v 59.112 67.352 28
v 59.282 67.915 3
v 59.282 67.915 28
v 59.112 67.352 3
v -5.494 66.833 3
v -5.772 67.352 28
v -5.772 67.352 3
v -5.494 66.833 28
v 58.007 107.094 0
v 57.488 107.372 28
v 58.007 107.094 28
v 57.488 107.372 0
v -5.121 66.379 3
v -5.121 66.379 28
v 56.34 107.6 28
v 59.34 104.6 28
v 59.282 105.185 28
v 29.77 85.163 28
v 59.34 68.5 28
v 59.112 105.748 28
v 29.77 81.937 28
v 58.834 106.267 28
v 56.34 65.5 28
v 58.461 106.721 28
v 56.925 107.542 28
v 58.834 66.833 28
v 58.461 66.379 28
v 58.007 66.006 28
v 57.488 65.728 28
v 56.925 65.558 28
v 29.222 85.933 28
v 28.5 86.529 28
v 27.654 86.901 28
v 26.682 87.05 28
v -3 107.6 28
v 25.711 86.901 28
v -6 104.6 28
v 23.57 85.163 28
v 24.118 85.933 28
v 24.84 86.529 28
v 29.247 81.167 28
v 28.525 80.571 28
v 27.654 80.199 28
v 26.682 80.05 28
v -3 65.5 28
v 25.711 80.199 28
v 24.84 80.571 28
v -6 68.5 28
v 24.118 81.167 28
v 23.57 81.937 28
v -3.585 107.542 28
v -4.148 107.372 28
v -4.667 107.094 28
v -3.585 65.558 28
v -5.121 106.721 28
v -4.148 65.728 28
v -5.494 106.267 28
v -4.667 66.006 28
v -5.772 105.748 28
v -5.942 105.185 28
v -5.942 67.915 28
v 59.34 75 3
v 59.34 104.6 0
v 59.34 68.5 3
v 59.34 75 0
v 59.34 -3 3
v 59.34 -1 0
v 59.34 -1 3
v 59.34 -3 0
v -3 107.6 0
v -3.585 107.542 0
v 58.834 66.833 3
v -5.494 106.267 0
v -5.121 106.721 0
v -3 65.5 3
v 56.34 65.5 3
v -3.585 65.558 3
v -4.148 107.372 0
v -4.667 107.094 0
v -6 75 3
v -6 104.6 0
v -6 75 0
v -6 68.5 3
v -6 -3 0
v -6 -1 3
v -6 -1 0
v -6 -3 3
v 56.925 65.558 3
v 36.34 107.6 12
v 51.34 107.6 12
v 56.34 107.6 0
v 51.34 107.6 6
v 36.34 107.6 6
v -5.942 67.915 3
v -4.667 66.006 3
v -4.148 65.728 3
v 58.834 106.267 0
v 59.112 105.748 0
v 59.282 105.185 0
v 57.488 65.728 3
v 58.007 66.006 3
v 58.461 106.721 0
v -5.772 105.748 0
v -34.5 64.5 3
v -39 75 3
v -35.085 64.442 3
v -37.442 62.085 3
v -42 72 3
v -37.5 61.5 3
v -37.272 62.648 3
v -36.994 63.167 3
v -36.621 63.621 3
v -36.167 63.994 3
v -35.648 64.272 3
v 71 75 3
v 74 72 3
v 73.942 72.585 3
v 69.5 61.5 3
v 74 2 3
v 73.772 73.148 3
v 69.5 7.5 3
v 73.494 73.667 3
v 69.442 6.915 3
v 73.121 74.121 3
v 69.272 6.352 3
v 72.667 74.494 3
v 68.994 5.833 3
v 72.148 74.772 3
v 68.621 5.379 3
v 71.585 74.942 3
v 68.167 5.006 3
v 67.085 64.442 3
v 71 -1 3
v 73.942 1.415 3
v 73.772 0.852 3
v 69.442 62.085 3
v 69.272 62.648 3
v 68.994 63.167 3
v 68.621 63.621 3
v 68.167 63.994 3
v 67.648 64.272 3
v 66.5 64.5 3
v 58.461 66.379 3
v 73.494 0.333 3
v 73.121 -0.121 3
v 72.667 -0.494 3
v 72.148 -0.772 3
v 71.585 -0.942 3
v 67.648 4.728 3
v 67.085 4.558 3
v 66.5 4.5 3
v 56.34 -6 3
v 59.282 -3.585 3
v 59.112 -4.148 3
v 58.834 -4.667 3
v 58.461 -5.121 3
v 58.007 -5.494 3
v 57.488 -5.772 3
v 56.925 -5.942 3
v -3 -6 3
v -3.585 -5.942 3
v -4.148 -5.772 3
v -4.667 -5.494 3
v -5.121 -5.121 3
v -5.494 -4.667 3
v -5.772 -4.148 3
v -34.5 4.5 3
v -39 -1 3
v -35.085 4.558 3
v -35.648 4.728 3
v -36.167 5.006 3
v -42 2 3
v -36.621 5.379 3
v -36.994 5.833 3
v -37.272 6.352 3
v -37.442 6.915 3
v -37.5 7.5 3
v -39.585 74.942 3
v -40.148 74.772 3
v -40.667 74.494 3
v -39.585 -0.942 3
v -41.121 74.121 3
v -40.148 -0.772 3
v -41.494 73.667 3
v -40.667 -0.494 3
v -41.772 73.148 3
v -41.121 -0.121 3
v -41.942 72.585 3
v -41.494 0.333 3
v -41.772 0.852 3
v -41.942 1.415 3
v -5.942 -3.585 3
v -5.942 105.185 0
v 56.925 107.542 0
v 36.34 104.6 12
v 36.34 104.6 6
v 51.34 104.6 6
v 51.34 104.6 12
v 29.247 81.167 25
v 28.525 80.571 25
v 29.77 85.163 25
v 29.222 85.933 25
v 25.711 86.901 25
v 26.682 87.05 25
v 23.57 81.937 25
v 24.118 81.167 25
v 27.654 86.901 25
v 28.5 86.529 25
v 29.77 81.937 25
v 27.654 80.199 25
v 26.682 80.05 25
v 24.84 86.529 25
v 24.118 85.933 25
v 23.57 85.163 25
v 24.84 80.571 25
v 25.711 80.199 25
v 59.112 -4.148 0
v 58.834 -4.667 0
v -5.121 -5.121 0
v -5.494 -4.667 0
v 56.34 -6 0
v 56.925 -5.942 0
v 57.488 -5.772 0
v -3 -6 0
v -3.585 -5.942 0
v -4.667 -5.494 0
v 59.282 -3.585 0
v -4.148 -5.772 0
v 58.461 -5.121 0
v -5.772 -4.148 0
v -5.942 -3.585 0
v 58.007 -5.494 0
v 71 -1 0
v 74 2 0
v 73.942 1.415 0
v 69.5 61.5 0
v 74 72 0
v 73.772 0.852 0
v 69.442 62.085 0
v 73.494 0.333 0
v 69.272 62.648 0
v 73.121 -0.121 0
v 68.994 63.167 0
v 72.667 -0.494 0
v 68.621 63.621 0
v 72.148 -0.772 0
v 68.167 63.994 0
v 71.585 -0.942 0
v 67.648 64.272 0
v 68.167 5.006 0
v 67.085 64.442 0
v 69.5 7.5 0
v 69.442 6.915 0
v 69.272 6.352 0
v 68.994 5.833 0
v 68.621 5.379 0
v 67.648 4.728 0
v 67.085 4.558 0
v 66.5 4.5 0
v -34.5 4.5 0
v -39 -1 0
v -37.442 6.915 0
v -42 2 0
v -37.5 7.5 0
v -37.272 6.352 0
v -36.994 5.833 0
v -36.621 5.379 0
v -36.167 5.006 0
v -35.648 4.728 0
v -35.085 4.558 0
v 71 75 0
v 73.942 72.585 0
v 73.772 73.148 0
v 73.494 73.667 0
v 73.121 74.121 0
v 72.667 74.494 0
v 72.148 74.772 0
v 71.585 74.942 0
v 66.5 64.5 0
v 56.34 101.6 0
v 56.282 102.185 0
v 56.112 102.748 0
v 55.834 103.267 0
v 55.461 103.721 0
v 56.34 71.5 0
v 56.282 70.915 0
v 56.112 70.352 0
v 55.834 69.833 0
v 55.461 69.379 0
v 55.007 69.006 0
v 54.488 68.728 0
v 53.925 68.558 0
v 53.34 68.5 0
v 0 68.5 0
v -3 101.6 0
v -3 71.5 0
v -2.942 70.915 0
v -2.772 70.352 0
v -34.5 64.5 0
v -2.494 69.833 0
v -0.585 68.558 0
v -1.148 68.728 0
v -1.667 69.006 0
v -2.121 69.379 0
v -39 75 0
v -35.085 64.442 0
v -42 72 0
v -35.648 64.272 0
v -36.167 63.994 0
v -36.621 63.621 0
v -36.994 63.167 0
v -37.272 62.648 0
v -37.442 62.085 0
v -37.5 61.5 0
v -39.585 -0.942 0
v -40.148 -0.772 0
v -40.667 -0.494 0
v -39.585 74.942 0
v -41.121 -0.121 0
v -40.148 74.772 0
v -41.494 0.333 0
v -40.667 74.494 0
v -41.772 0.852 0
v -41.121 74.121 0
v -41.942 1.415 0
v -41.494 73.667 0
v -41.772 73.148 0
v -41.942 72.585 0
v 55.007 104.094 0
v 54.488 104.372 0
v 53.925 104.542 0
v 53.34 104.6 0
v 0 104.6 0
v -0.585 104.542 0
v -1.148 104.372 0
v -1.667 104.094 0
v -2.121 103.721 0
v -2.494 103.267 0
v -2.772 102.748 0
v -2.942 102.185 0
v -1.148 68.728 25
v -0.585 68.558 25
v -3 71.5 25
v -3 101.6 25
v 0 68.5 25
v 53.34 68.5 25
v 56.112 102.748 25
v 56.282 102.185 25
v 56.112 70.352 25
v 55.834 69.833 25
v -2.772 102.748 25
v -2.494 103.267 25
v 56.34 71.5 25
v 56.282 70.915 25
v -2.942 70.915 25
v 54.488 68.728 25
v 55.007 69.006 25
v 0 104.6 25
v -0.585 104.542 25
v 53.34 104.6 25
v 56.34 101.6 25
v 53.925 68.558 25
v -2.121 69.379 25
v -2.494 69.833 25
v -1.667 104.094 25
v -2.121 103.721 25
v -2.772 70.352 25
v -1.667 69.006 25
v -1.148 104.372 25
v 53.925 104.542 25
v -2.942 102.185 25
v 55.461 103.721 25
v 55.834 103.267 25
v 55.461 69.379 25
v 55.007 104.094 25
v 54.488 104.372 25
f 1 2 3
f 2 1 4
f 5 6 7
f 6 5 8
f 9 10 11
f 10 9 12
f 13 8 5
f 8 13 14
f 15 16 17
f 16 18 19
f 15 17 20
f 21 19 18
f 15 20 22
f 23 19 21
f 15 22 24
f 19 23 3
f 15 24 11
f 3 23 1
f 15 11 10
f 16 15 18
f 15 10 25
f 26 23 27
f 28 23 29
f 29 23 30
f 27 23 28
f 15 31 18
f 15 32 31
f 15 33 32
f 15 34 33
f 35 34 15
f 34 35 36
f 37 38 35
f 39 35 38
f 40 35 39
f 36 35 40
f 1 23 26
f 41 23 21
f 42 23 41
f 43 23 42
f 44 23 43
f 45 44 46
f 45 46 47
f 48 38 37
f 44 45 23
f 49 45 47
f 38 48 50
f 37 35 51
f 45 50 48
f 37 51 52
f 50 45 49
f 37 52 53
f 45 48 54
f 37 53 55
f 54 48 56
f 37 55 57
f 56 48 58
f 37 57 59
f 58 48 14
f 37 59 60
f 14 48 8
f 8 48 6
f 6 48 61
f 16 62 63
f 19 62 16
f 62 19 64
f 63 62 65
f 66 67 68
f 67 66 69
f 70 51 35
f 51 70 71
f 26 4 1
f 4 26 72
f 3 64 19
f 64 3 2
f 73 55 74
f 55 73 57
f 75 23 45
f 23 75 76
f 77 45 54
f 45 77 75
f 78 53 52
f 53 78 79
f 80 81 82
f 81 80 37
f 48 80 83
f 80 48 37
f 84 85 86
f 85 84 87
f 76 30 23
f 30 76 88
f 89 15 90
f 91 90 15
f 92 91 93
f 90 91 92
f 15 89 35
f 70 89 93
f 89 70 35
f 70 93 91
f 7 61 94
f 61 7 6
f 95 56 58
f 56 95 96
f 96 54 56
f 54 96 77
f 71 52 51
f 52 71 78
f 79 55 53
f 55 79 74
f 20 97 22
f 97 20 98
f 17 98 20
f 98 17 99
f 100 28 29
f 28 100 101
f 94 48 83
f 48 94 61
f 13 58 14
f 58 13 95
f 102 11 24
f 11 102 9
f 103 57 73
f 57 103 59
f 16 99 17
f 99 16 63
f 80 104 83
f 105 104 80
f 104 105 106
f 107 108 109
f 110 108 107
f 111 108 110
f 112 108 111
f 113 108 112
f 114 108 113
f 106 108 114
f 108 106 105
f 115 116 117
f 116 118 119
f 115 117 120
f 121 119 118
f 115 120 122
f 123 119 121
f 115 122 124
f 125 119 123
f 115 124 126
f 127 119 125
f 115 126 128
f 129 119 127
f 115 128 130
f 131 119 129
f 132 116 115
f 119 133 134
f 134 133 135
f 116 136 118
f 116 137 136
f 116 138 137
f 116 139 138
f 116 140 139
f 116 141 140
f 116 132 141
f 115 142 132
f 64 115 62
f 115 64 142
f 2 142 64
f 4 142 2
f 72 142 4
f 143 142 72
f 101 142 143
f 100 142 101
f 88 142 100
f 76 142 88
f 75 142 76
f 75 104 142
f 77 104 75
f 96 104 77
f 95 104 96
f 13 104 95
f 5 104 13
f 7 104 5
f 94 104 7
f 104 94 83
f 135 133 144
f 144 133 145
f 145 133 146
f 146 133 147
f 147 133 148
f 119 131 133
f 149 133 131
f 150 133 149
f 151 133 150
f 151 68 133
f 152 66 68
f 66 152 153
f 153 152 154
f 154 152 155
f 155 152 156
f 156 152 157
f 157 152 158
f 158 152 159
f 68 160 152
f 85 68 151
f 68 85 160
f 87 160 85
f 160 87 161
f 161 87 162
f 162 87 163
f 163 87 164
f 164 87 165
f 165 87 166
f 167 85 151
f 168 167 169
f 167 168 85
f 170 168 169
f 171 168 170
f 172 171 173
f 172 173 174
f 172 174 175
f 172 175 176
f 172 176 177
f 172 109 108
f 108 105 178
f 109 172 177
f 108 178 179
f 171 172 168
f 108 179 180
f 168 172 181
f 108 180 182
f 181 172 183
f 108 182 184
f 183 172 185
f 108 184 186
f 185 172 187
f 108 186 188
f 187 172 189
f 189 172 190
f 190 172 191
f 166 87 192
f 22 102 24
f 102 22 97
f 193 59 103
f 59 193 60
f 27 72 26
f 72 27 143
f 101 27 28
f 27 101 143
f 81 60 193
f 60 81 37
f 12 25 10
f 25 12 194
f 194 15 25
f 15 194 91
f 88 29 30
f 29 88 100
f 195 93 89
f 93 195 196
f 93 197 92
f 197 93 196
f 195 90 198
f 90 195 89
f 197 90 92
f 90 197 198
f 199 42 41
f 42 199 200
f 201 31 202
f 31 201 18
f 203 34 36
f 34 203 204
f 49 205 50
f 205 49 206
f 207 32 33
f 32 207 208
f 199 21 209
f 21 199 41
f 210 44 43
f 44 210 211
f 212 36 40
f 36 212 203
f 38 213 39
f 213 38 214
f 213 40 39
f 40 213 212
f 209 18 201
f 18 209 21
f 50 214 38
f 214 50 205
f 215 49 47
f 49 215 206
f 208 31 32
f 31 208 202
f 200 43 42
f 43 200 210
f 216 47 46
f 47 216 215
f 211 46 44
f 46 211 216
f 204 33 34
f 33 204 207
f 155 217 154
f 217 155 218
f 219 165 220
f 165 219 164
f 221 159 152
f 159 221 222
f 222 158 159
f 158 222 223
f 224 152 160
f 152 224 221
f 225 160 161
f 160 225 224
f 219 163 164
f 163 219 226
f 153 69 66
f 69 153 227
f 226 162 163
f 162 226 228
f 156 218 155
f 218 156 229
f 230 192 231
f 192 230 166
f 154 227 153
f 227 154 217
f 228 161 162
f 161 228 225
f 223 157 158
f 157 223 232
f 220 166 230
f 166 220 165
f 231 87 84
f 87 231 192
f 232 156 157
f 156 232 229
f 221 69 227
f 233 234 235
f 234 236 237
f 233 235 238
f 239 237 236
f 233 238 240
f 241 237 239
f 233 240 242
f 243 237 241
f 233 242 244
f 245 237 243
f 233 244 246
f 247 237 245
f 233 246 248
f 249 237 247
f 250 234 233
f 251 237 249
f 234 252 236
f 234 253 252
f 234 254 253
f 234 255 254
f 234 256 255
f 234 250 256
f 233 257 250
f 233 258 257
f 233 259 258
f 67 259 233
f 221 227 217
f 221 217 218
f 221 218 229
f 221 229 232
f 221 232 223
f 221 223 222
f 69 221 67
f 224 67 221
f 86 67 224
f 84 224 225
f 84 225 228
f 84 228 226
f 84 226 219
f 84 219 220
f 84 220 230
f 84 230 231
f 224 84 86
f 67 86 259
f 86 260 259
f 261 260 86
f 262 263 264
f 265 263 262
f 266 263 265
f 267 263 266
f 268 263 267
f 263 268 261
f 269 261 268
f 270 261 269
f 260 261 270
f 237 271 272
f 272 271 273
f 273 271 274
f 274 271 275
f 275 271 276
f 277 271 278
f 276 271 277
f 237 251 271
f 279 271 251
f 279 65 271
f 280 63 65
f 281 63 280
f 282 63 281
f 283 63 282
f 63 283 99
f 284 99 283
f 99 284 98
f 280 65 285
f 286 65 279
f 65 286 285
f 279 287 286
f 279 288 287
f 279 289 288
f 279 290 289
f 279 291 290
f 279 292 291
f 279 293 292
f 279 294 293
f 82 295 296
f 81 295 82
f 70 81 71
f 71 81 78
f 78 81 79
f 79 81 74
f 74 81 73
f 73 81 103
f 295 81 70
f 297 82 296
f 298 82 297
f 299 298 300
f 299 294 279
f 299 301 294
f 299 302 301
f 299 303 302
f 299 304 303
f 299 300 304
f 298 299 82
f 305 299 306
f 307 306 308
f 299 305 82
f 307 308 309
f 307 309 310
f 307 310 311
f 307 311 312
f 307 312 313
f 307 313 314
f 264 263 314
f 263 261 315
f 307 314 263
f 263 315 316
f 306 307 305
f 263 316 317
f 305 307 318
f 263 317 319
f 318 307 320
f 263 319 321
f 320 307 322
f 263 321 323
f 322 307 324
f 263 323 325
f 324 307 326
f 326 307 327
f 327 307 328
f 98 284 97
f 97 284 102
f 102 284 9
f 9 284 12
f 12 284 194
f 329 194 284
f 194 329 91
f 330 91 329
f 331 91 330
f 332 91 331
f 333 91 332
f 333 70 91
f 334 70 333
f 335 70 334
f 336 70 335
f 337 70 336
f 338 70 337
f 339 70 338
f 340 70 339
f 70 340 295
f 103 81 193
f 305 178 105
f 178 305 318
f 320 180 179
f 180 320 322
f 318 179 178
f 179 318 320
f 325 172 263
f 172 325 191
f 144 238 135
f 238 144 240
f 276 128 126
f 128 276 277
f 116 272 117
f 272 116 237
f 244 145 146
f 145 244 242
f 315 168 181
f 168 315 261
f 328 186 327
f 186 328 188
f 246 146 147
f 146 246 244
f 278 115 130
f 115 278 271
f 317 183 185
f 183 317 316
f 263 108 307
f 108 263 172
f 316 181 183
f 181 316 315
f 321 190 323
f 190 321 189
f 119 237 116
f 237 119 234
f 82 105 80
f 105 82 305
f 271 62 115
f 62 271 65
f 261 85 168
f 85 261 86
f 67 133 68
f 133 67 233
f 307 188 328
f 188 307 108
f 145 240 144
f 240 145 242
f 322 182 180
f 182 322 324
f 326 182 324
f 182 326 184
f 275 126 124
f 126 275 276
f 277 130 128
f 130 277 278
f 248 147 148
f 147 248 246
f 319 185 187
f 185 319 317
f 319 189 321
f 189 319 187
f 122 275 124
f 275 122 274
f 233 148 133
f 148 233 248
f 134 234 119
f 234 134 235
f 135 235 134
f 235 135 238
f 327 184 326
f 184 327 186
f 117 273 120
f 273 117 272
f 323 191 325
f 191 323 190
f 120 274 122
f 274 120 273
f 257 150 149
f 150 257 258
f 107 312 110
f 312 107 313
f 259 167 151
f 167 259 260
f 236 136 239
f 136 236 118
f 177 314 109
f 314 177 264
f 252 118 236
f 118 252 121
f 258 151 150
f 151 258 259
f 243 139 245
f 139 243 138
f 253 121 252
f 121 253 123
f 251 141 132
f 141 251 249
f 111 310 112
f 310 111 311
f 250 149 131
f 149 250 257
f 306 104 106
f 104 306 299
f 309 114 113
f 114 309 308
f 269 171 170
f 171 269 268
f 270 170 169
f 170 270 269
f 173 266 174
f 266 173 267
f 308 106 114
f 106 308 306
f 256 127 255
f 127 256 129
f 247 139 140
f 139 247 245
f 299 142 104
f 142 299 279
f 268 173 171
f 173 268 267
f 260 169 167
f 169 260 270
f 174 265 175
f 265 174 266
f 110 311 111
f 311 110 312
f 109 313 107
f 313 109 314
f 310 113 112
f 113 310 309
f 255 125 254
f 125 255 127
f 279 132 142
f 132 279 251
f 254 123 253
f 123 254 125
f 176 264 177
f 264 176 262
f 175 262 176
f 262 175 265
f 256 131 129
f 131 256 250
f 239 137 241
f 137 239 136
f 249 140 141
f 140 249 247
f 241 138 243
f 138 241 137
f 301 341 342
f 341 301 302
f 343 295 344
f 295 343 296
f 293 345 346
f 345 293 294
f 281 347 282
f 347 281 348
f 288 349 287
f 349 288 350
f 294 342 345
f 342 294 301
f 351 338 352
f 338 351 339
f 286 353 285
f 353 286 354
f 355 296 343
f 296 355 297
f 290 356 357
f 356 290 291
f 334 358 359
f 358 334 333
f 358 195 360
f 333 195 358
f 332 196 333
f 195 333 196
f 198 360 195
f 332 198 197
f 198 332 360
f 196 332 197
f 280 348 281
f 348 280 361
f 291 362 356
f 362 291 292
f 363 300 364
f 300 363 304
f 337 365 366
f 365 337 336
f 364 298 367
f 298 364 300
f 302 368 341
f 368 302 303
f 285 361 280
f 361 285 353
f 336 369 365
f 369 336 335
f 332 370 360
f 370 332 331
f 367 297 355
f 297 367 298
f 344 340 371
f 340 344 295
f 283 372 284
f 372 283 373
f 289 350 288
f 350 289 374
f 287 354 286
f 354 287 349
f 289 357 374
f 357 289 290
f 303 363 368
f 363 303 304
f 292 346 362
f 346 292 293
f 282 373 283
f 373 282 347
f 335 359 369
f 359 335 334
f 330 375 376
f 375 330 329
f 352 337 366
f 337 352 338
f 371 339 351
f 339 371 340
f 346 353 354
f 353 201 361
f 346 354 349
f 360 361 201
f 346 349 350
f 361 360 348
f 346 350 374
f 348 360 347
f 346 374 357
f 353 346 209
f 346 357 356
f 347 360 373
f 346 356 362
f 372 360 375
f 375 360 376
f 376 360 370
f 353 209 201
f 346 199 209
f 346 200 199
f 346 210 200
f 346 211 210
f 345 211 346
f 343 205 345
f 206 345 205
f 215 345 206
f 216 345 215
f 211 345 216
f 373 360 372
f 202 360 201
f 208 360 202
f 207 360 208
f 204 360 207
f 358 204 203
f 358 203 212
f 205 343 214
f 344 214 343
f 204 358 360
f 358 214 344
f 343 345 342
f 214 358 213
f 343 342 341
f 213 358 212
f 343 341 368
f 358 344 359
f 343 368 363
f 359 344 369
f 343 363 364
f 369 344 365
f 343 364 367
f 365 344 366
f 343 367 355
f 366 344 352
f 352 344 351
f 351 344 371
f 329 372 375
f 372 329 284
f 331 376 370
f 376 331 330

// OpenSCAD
// file: pins.scad
// Pin Connectors V3
// Tony Buser <tbuser@gmail.com>
// Modified by Emmett Lalish

object=4;//[0:pin,1:pinpeg,2:pinhole,4:nothing]
length=20;
diameter=8;
//Only affects pinhole
hole_twist=0;//[0:free,1:fixed]
//Only affects pinhole
hole_friction=0;//[0:loose,1:tight]
//Radial gap to help pins fit into tight holes
pin_tolerance=0.2;
//Extra gap to make loose hole
loose=0.3;
lip_height=3;
lip_thickness=1;
hf=hole_friction==0 ? false : true;
ht=hole_twist==0 ? false : true;

if(object==0)pin(h=length,r=diameter/2,lh=lip_height,lt=lip_thickness,t=pin_tolerance);
if(object==1)pinpeg(h=length,r=diameter/2,lh=lip_height,lt=lip_thickness,t=pin_tolerance);
if(object==2)pinhole(h=length,r=diameter/2,lh=lip_height,lt=lip_thickness,t=loose,
	tight=hf,fixed=ht);

module test() {
  tolerance = 0.3;
  
  translate([-12, 12, 0]) pinpeg(h=20);
  translate([12, 12, 0]) pintack(h=10);
  
  difference() {
    union() {
      translate([0, -12, 2.5]) cube(size = [59, 20, 5], center = true);
      translate([24, -12, 7.5]) cube(size = [12, 20, 15], center = true);
    }
    translate([-24, -12, 0]) pinhole(h=5, t=tolerance);
    translate([-12, -12, 0]) pinhole(h=5, t=tolerance, tight=false);
    translate([0, -12, 0]) pinhole(h=10, t=tolerance);
    translate([12, -12, 0]) pinhole(h=10, t=tolerance, tight=false);
    translate([24, -12, 15]) rotate([0, 180, 0]) pinhole(h=10, t=tolerance);
  }
}

module pinhole(h=10, r=4, lh=3, lt=1, t=0.3, tight=true, fixed=false) {
  // h = shaft height
  // r = shaft radius
  // lh = lip height
  // lt = lip thickness
  // t = extra tolerance for loose fit
  // tight = set to false if you want a joint that spins easily
  // fixed = set to true so pins can't spin
  
intersection(){
  union() {
	if (tight == true || fixed == true) {
      pin_solid(h, r, lh, lt);
	  translate([0,0,-t/2])cylinder(h=h+t, r=r, $fn=30);
	} else {
	  pin_solid(h, r+t/2, lh, lt);
	  translate([0,0,-t/2])cylinder(h=h+t, r=r+t/2, $fn=30);
	}
    
    
    // widen the entrance hole to make insertion easier
    //translate([0, 0, -0.1]) cylinder(h=lh/3, r2=r, r1=r+(t/2)+(lt/2),$fn=30);
  }
  if (fixed == true) {
	translate([-r*2, -r*0.75, -1])cube([r*4, r*1.5, h+2]);
  }
}}

module pin(h=10, r=4, lh=3, lt=1, t=0.2, side=false) {
  // h = shaft height
  // r = shaft radius
  // lh = lip height
  // lt = lip thickness
  // side = set to true if you want it printed horizontally

  if (side) {
    pin_horizontal(h, r, lh, lt, t);
  } else {
    pin_vertical(h, r, lh, lt, t);
  }
}

module pintack(h=10, r=4, lh=3, lt=1, t=0.2, bh=3, br=8.75) {
  // bh = base_height
  // br = base_radius
  
  union() {
    cylinder(h=bh, r=br);
    translate([0, 0, bh]) pin(h, r, lh, lt, t);
  }
}

module pinpeg(h=20, r=4, lh=3, lt=1, t=0.2) {
  union() {
    translate([0,-0.05, 0]) pin(h/2+0.1, r, lh, lt, t, side=true);
    translate([0,0.05, 0]) rotate([0, 0, 180]) pin(h/2+0.1, r, lh, lt, t, side=true);
  }
}

// just call pin instead, I made this module because it was easier to do the rotation option this way
// since openscad complains of recursion if I did it all in one module
module pin_vertical(h=10, r=4, lh=3, lt=1, t=0.2) {
  // h = shaft height
  // r = shaft radius
  // lh = lip height
  // lt = lip thickness

  difference() {
    pin_solid(h, r-t/2, lh, lt);
    
    // center cut
    translate([-lt*3/2, -(r*2+lt*2)/2, h/5+lt*3/2]) cube([lt*3, r*2+lt*2, h]);
    //translate([0, 0, h/4]) cylinder(h=h+lh, r=r/2.5, $fn=20);
    // center curve
    translate([0, 0, h/5+lt*3/2]) rotate([90, 0, 0]) cylinder(h=r*2, r=lt*3/2, center=true, $fn=20);
  
    // side cuts
    translate([-r*2, -r-r*0.75+t/2, -1]) cube([r*4, r, h+2]);
    translate([-r*2, r*0.75-t/2, -1]) cube([r*4, r, h+2]);
  }
}

// call pin with side=true instead of this
module pin_horizontal(h=10, r=4, lh=3, lt=1, t=0.2) {
  // h = shaft height
  // r = shaft radius
  // lh = lip height
  // lt = lip thickness
  translate([0, 0, r*0.75-t/2]) rotate([-90, 0, 0]) pin_vertical(h, r, lh, lt, t);
}

// this is mainly to make the pinhole module easier
module pin_solid(h=10, r=4, lh=3, lt=1) {
  union() {
    // shaft
    cylinder(h=h-lh, r=r, $fn=30);
    // lip
    // translate([0, 0, h-lh]) cylinder(h=lh*0.25, r1=r, r2=r+(lt/2), $fn=30);
    // translate([0, 0, h-lh+lh*0.25]) cylinder(h=lh*0.25, r2=r, r1=r+(lt/2), $fn=30);
    // translate([0, 0, h-lh+lh*0.50]) cylinder(h=lh*0.50, r1=r, r2=r-(lt/2), $fn=30);

    // translate([0, 0, h-lh]) cylinder(h=lh*0.50, r1=r, r2=r+(lt/2), $fn=30);
    // translate([0, 0, h-lh+lh*0.50]) cylinder(h=lh*0.50, r1=r+(lt/2), r2=r-(lt/3), $fn=30);    

    translate([0, 0, h-lh]) cylinder(h=lh*0.25, r1=r, r2=r+(lt/2), $fn=30);
    translate([0, 0, h-lh+lh*0.25]) cylinder(h=lh*0.25, r=r+(lt/2), $fn=30);    
    translate([0, 0, h-lh+lh*0.50]) cylinder(h=lh*0.50, r1=r+(lt/2), r2=r-(lt/2), $fn=30);    

    // translate([0, 0, h-lh]) cylinder(h=lh, r1=r+(lt/2), r2=1, $fn=30);
    // translate([0, 0, h-lh-lt/2]) cylinder(h=lt/2, r1=r, r2=r+(lt/2), $fn=30);
  }
}

module pinshaft(h=10, r=4, t=0.2, side=false){
flip=side ? 1 : 0;
translate(flip*[0,h/2,r*0.75-t/2])rotate(flip*[90,0,0])
intersection(){
	cylinder(h=h, r=r-t/2, $fn=30);
	translate([-r*2, -r*0.75+t/2, -1])cube([r*4, r*1.5-t, h+2]);
}
}
// main file
// Arduino connectors library
//
// Copyright (c) 2013 Kelly Egan
//
// The MIT License (MIT)
//
// Permission is hereby granted, free of charge, to any person obtaining a copy of this software 
// and associated documentation files (the "Software"), to deal in the Software without restriction, 
// including without limitation the rights to use, copy, modify, merge, publish, distribute, sublicense,
// and/or sell copies of the Software, and to permit persons to whom the Software is furnished to do 
// so, subject to the following conditions:
//
// The above copyright notice and this permission notice shall be included in all copies or substantial
// portions of the Software.
//
// THE SOFTWARE IS PROVIDED "AS IS", WITHOUT WARRANTY OF ANY KIND, EXPRESS OR IMPLIED, INCLUDING BUT 
// NOT LIMITED TO THE WARRANTIES OF MERCHANTABILITY, FITNESS FOR A PARTICULAR PURPOSE AND NONINFRINGEMENT. 
// IN NO EVENT SHALL THE AUTHORS OR COPYRIGHT HOLDERS BE LIABLE FOR ANY CLAIM, DAMAGES OR OTHER LIABILITY,
// WHETHER IN AN ACTION OF CONTRACT, TORT OR OTHERWISE, ARISING FROM, OUT OF OR IN CONNECTION WITH THE 
// SOFTWARE OR THE USE OR OTHER DEALINGS IN THE SOFTWARE.
//

include <pins.scad>

gdWidth = 70;
gdLength = 110;
gdXOffset = gdLength-36;
gdYOffset = -1;

enclosureLid(MEGA2560);
//enclosure(MEGA2560);

//Constructs a roughed out arduino board
//Current only USB, power and headers
module arduino(boardType = UNO) {
	//The PCB with holes
	difference() {
		color("SteelBlue") 
			boardShape( boardType );
		translate([0,0,-pcbHeight * 0.5]) holePlacement(boardType = boardType)
			color("SteelBlue") cylinder(r = mountingHoleRadius, h = pcbHeight * 2, $fn=32);
	}
	//Add all components to board
	components( boardType = boardType, component = ALL );
}

//Creates a bumper style enclosure that fits tightly around the edge of the PCB.
module bumper( boardType = UNO, mountingHoles = false ) {
	bumperBaseHeight = 2;
	bumperHeight = bumperBaseHeight + pcbHeight + 0.5;
	dimensions = boardDimensions(boardType);

	difference() {
		union() {
			//Outer rim of bumper
			difference() {
				boardShape(boardType = boardType, offset=1.4, height = bumperHeight);
				translate([0,0,-0.1])
					boardShape(boardType = boardType, height = bumperHeight + 0.2);
			}

			//Base of bumper	
			difference() {
				boardShape(boardType = boardType, offset=1, height = bumperBaseHeight);
				translate([0,0, -0.1])
					boardShape(boardType = boardType, offset=-2, height = bumperHeight + 0.2);
			}

			//Board mounting holes
			holePlacement(boardType=boardType)
				cylinder(r = mountingHoleRadius + 1.5, h = bumperBaseHeight, $fn = 32);

			//Bumper mounting holes (exterior)
			if( mountingHoles ) {
				difference() {	
					hull() {
						translate([-6, (dimensions[1] - 6) / 2, 0])
							cylinder( r = 6, h = pcbHeight + 2, $fn = 32 );
						translate([ -0.5, dimensions[0] / 2 - 9, 0]) 
							cube([0.5, 12, bumperHeight]);
					}
					translate([-6, (dimensions[0] - 6) / 2, 0])
						mountingHole(holeDepth = bumperHeight);
				}
				difference() {	
					hull() {
						translate([dimensions[0] + 6, (dimensions[1] - 6) / 2,0])
							cylinder( r = 6, h = pcbHeight + 2, $fn = 32 );
						translate([ dimensions[0], dimensions[1] / 2 - 9, 0]) 
							cube([0.5, 12, bumperHeight]);
					}
					translate([dimensions[0] + 6, (dimensions[1] - 6) / 2,0])
						mountingHole(holeDepth = bumperHeight);
				}
			}
		}
		translate([0,0,-0.5])
		holePlacement(boardType=boardType)
			cylinder(r = mountingHoleRadius, h = bumperHeight, $fn = 32);	
		translate([0, 0, bumperBaseHeight]) {
			components(boardType = boardType, component = ALL, offset = 1);
		}
		translate([4,(dimensions[1] - dimensions[1] * 0.4)/2,-1])
			cube([dimensions[0] -8,dimensions[1] * 0.4,bumperBaseHeight + 2]);
	}
}

//Setting for enclosure mounting holes (Not Arduino mounting)
NOMOUNTINGHOLES = 0;
INTERIORMOUNTINGHOLES = 1;
EXTERIORMOUNTINGHOLES = 2;

module prism(l, w, h) {
	linear_extrude(height = l) polygon(points = [
		[0, 0],
		[w, 0],
		[0, h]
	], paths=[[0,1,2,0]]);
}

//Create a board enclosure
module enclosure(boardType = UNO, wall = 3, offset = 3, heightExtension = 10, cornerRadius = 3, mountType = TAPHOLE) {
	standOffHeight = 5;

	dimensions = boardDimensions(boardType);
	boardDim = boardDimensions(boardType);
	pcbDim = pcbDimensions(boardType);

	enclosureWidth = pcbDim[0] + (wall + offset) * 2;
	enclosureDepth = pcbDim[1] + (wall + offset) * 2;
	enclosureHeight = boardDim[2] + wall + standOffHeight + heightExtension;

	gdHeight = enclosureHeight *0.4;
	gdOffset = (enclosureHeight * 0.7)-wall;



	union() {
		difference() {
			//Main box shape
			boundingBox(boardType = boardType, height = enclosureHeight, offset = wall + offset, include=PCB, cornerRadius = wall);
	
			translate([ 0, 0, wall]) {
				//Interior of box
				boundingBox(boardType = boardType, height = enclosureHeight, offset = offset, include=PCB, cornerRadius = wall);
	
				//Punch outs for USB and POWER
				translate([0, 0, standOffHeight]) {
					components(boardType = boardType, offset = 1, extension = wall + offset + 10);
				}
			}
			
			//Holes for lid clips
			translate([0, enclosureDepth * 0.75 - (offset + wall), enclosureHeight]) {
				translate([-offset, 0, 0])
					rotate([0, 180, 90]) clipHole(clipHeight = 10, holeDepth = wall + 0.2);
				translate([offset + boardDim[0], 0, 0])
					rotate([0, 180, 270]) clipHole(clipHeight = 10, holeDepth = wall + 0.2);
			}
		
			translate([0, enclosureDepth * 0.25 - (offset + wall), enclosureHeight]) {
				translate([-offset, 0, 0])
					rotate([0, 180, 90]) clipHole(clipHeight = 10, holeDepth = wall + 0.2);
				translate([offset + dimensions[0], 0, 0])
					rotate([0, 180, 270]) clipHole(clipHeight = 10, holeDepth = wall + 0.2);
			}

            //remove section for Gameduino
            translate([gdXOffset,gdYOffset,gdOffset]){
			    rotate([0,0,90])
                    //boundingBox(boardType=boardType,height = gameduinoHeight,offset=wall+offset, cornerRadius=wall);  
                    roundedCube( [gdWidth+(wall*2),gdLength+(wall*2), gdHeight], cornerRadius=wall);
            }
	 
		}
		translate([0, 0, wall]) {
			standoffs(boardType = boardType, height = standOffHeight, mountType = mountType);
		}


        difference() {		
		    translate([gdXOffset,gdYOffset,gdOffset]){
			    rotate([0,0,90]) { 
				    difference(){
					    //Gameduino Box
                        roundedCube( [gdWidth+(wall*2),gdLength+(wall*2), gdHeight], cornerRadius=wall);
                  
					    //Interior of Gameduino box
					    translate([ wall, wall, wall]) {
						    //boundingBox(boardType = boardType, height = gameduinoHeight, offset = offset, cornerRadius = wall);
						    roundedCube( [gdWidth,gdLength,gdHeight], cornerRadius=wall);
                            
					    }
                    }
			    }
		    }

            //Removing main box section from Gameduino box
       		boundingBox(boardType = boardType, height = enclosureHeight+gdOffset, offset = offset, include=PCB, cornerRadius = wall);

        }
        
	}


    //right hand supports    
    translate([enclosureWidth-offset-cornerRadius,gdYOffset+wall,gdOffset+1]) 
        rotate([-90,0,0]) {
            
            minkowski() {
               	prism(gdWidth,gdXOffset-enclosureWidth+cornerRadius , gdOffset); //l,w,h
    
                translate([0,1,0])
	                rotate([90,90,0])
                       	cylinder(r=cornerRadius,h=1,$fn=32);
            }
    }

    //left hand supports

   translate([-offset-wall,gdWidth+gdYOffset+wall,gdOffset+1]) 
        rotate([-90,0,180]) {
            
            minkowski() {
               	prism(gdWidth,gdOffset+wall+cornerRadius+1.49+7 , gdOffset); //l,w,h
    
                translate([0,1,0])
	                rotate([90,90,0])
                       	cylinder(r=cornerRadius,h=1,$fn=32);
            }
    }

}


//Create a snap on lid for enclosure
module enclosureLid( boardType = UNO, wall = 3, offset = 3, cornerRadius = 3, ventHoles = false) {
	dimensions = boardDimensions(boardType);
	boardDim = boardDimensions(boardType);
	pcbDim = pcbDimensions(boardType);

	enclosureWidth = pcbDim[0] + (wall + offset) * 2;
	enclosureDepth = pcbDim[1] + (wall + offset) * 2;

    prismAdj = enclosureDepth-gdWidth-(wall*2)-(cornerRadius*2)+4.5;
    prismOpp = 25;
    prismAngle = atan(prismOpp/prismAdj);

	difference() {
		union() {

			boundingBox(boardType = boardType, height = wall, offset = wall + offset, include=PCB, cornerRadius = wall);

            translate([-wall*2,gdWidth-wall-1.5,wall])

                    difference() {

 							//Encoder panel cutout
							roundedCube( [enclosureWidth,prismAdj+(wall*2), prismOpp], cornerRadius=wall);

                        //cable cutout
                        translate([enclosureWidth-23,prismAdj+10,3])
                            rotate([90,0,0])
                        		   cube([15,6,20]);


                        //encoder cutout
                        translate([enclosureWidth/2-3.1,prismAdj/2-3.5,0])  
                            //rotate([prismAngle+180,90,270])
                                resize([6.2,7,0], auto=true)
                                    linear_extrude(height=100)
                                        import("rotary.dxf");
                    }



/*

		// Lid lip
			translate([0, 0, -wall * 0.5])
   				boundingBox(boardType = boardType, height = wall * 0.5, offset = offset - 0.5, include=PCB, cornerRadius = wall); */
		
			//Lid clips
       /* 
			translate([0, enclosureDepth * 0.75 - (offset + wall), 0]) {
				translate([-offset, 0, 0])
					rotate([0, 180, 90]) clip(clipHeight = 10);
				translate([offset + boardDim[0], 0, 0])
					rotate([0, 180, 270]) clip(clipHeight = 10);
			} */
		/*
			translate([0, enclosureDepth * 0.25 - (offset + wall), 0]) {
				translate([-offset, 0, 0])
					rotate([0, 180, 90]) clip(clipHeight = 10);
				translate([offset + dimensions[0], 0, 0])
					rotate([0, 180, 270]) clip(clipHeight = 10);
			}*/

            //Gameduino
		    translate([gdXOffset,gdYOffset,0]){
			    rotate([0,0,90]) { 
                        union() {
                            roundedCube( [gdWidth+(wall*2),gdLength+(wall*2), wall], cornerRadius=wall);

							//Gameduino lip
							/*
                            translate([0.5+wall, 0.5+wall, -wall * 0.5])
                                roundedCube( [gdWidth-0.5,gdLength-0.5, wall*0.5], cornerRadius=wall);  
							*/
                            }

			    }
		    }


		}

        //screen cutout
        translate([gdXOffset,gdYOffset,0]){
		    rotate([0,0,90]) { 
                    translate([wall+2.5,wall+1.5,-wall])                        
                    roundedCube( [gdWidth-10,gdLength-3, (wall*3)], cornerRadius=wall);
            }
        }

		//encoder panel cutout
		 translate([-wall,gdWidth-1.5,-wall*2]) {

			roundedCube( [enclosureWidth-(wall*2),prismAdj, prismOpp+(wall*2)], cornerRadius=wall);
        }

	}
}

//Offset from board. Negative values are insets
module boardShape( boardType = UNO, offset = 0, height = pcbHeight ) {
	dimensions = boardDimensions(boardType);

	xScale = (dimensions[0] + offset * 2) / dimensions[0];
	yScale = (dimensions[1] + offset * 2) / dimensions[1];

	translate([-offset, -offset, 0])
		scale([xScale, yScale, 1.0])
			linear_extrude(height = height) 
				polygon(points = boardShapes[boardType]);
}

//Create a bounding box around the board
//Offset - will increase the size of the box on each side,
//Height - overides the boardHeight and offset in the z direction

BOARD = 0;        //Includes all components and PCB
PCB = 1;          //Just the PCB
COMPONENTS = 2;   //Just the components

module boundingBox(boardType = UNO, offset = 0, height = 0, cornerRadius = 0, include = BOARD) {
	//What parts are included? Entire board, pcb or just components.
	pos = ([boardPosition(boardType), pcbPosition(boardType), componentsPosition(boardType)])[include];
	dim = ([boardDimensions(boardType), pcbDimensions(boardType), componentsDimensions(boardType)])[include];

	//Depending on if height is set position and dimensions will change
	position = [
				pos[0] - offset, 
				pos[1] - offset, 
				(height == 0 ? pos[2] - offset : pos[2] )
				];

	dimensions = [
				dim[0] + offset * 2, 
				dim[1] + offset * 2, 
				(height == 0 ? dim[2] + offset * 2 : height)
				];

	translate( position ) {
		if( cornerRadius == 0 ) {
			cube( dimensions );
		} else {
			roundedCube( dimensions, cornerRadius=cornerRadius );
		}
	}
}

//Creates standoffs for different boards
TAPHOLE = 0;
PIN = 1;

module standoffs( 
	boardType = UNO, 
	height = 10, 
	topRadius = mountingHoleRadius + 1, 
	bottomRadius =  mountingHoleRadius + 2, 
	holeRadius = mountingHoleRadius,
	mountType = TAPHOLE
	) {

	holePlacement(boardType = boardType)
		union() {
			difference() {
				cylinder(r1 = bottomRadius, r2 = topRadius, h = height, $fn=32);
				if( mountType == TAPHOLE ) {
					cylinder(r =  holeRadius, h = height * 4, center = true, $fn=32);
				}
			}
			if( mountType == PIN ) {
				translate([0, 0, height - 1])
				pintack( h=pcbHeight + 3, r = holeRadius, lh=3, lt=1, bh=1, br=topRadius );
			}
		}	
}

//This is used for placing the mounting holes and for making standoffs
//child elements will be centered on that chosen boards mounting hole centers
module holePlacement(boardType = UNO ) {
	for(i = boardHoles[boardType] ) {
		translate(i)
			child(0);
	}
}

//Places components on board
//  compenent - the data set with a particular component (like boardHeaders)
//  extend - the amount to extend the component in the direction of its socket
//  offset - the amount to increase the components other two boundaries

//Component IDs
ALL = -1;
HEADER_F = 0;
HEADER_M = 1;
USB = 2;
POWER = 3;

module components( boardType = UNO, component = ALL, extension = 0, offset = 0 ) {
	translate([0, 0, pcbHeight]) {
		for( i = [0:len(components[boardType]) - 1] ){
			if( components[boardType][i][3] == component || component == ALL) {
				assign( 
					//Calculates position + adjustment for offset and extention  
					position = components[boardType][i][0] - (([1,1,1] - components[boardType][i][2]) * offset)
						+ [	min(components[boardType][i][2][0],0), 
						 	min(components[boardType][i][2][1],0),
	               			min(components[boardType][i][2][2],0) ] * extension,
					//Calculates the full box size including offset and extention
					dimensions = components[boardType][i][1] 
						+ ((components[boardType][i][2] * [1,1,1]) 
							* components[boardType][i][2]) * extension
						+ ([1,1,1] - components[boardType][i][2]) * offset * 2 
					) {					
					translate( position ) color( components[boardType][i][4] ) 
						cube( dimensions );
				}
			}
		}	
	}
}

module roundedCube( dimensions = [10,10,10], cornerRadius = 1, faces=32 ) {
	hull() cornerCylinders( dimensions = dimensions, cornerRadius = cornerRadius, faces=faces ); 
}

module cornerCylinders( dimensions = [10,10,10], cornerRadius = 1, faces=32 ) {
	translate([ cornerRadius, cornerRadius, 0]) {
		cylinder( r = cornerRadius, $fn = faces, h = dimensions[2] );
		translate([dimensions[0] - cornerRadius * 2, 0, 0]) cylinder( r = cornerRadius, $fn = faces, h = dimensions[2] );
		translate([0, dimensions[1] - cornerRadius * 2, 0]) {
			cylinder( r = cornerRadius, $fn = faces, h = dimensions[2] );
			translate([dimensions[0] - cornerRadius * 2, 0, 0]) cylinder( r = cornerRadius, $fn = faces, h = dimensions[2] );
		}
	}
}

//Create a clip that snapps into a clipHole
module clip(clipWidth = 5, clipDepth = 5, clipHeight = 5, lipDepth = 1.5, lipHeight = 3) {
	translate([-clipWidth/2,-(clipDepth-lipDepth),0]) rotate([90, 0, 90])
	linear_extrude(height = clipWidth, convexity = 10)
		polygon(	points=[	[0, 0], 
						[clipDepth - lipDepth, 0],
						[clipDepth - lipDepth, clipHeight - lipHeight],
						[clipDepth - 0.25, clipHeight - lipHeight],
						[clipDepth, clipHeight - lipHeight + 0.25],
						[clipDepth - lipDepth * 0.8, clipHeight],
						[(clipDepth - lipDepth) * 0.3, clipHeight] 
						], 
				paths=[[0,1,2,3,4,5,6,7]]
			);
}

//Hole for clip
module clipHole(clipWidth = 5, clipDepth = 5, clipHeight = 5, lipDepth = 1.5, lipHeight = 3, holeDepth = 5) {
	offset = 0.1;
	translate([-clipWidth/2,-(clipDepth-lipDepth),0])
	translate([-offset, clipDepth - lipDepth-offset, clipHeight - lipHeight - offset])
		cube( [clipWidth + offset * 2, holeDepth, lipHeight + offset * 2] );
}

module mountingHole(screwHeadRad = woodscrewHeadRad, screwThreadRad = woodscrewThreadRad, screwHeadHeight = woodscrewHeadHeight, holeDepth = 10) {
	union() {
		translate([0, 0, -0.01])
			cylinder( r = screwThreadRad, h = 1.02, $fn = 32 );
		translate([0, 0, 1])
			cylinder( r1 = screwThreadRad, r2 = screwHeadRad, h = screwHeadHeight, $fn = 32 );
		translate([0, 0, screwHeadHeight - 0.01 + 1])
			cylinder( r = screwHeadRad, h = holeDepth - screwHeadHeight + 0.02, $fn = 32 );
	}
}

/******************************** UTILITY FUNCTIONS *******************************/

//Return the length side of a square given its diagonal
function sides( diagonal ) = sqrt(diagonal * diagonal  / 2);

//Return the minimum values between two vectors of either length 2 or 3. 2D Vectors are treated as 3D vectors who final value is 0.
function minVec( vector1, vector2 ) =
	[min(vector1[0], vector2[0]), min(vector1[1], vector2[1]), min((vector1[2] == undef ? 0 : vector1[2]), (vector2[2] == undef ? 0 : vector2[2]) )];

//Return the maximum values between two vectors of either length 2 or 3. 2D Vectors are treated as 3D vectors who final value is 0.
function maxVec( vector1, vector2 ) =
	[max(vector1[0], vector2[0]), max(vector1[1], vector2[1]), max((vector1[2] == undef ? 0 : vector1[2]), (vector2[2] == undef ? 0 : vector2[2]) )];

//Determine the minimum point on a component in a list of components
function minCompPoint( list, index = 0, minimum = [10000000, 10000000, 10000000] ) = 
	index >= len(list) ? minimum : minCompPoint( list, index + 1, minVec( minimum, list[index][0] ));

//Determine the maximum point on a component in a list of components
function maxCompPoint( list, index = 0, maximum = [-10000000, -10000000, -10000000] ) = 
	index >= len(list) ? maximum : maxCompPoint( list, index + 1, maxVec( maximum, list[index][0] + list[index][1]));

//Determine the minimum point in a list of points
function minPoint( list, index = 0, minimum = [10000000, 10000000, 10000000] ) = 
	index >= len(list) ? minimum : minPoint( list, index + 1, minVec( minimum, list[index] ));

//Determine the maximum point in a list of points
function maxPoint( list, index = 0, maximum = [-10000000, -10000000, -10000000] ) = 
	index >= len(list) ? maximum : maxPoint( list, index + 1, maxVec( maximum, list[index] ));

//Returns the pcb position and dimensions
function pcbPosition(boardType = UNO) = minPoint(boardShapes[boardType]);
function pcbDimensions(boardType = UNO) = maxPoint(boardShapes[boardType]) - minPoint(boardShapes[boardType]) + [0, 0, pcbHeight];

//Returns the position of the box containing all components and its dimensions
function componentsPosition(boardType = UNO) = minCompPoint(components[boardType]) + [0, 0, pcbHeight];
function componentsDimensions(boardType = UNO) = maxCompPoint(components[boardType]) - minCompPoint(components[boardType]);

//Returns the position and dimensions of the box containing the pcb board
function boardPosition(boardType = UNO) = 
	minCompPoint([[pcbPosition(boardType), pcbDimensions(boardType)], [componentsPosition(boardType), componentsDimensions(boardType)]]);
function boardDimensions(boardType = UNO) = 
	maxCompPoint([[pcbPosition(boardType), pcbDimensions(boardType)], [componentsPosition(boardType), componentsDimensions(boardType)]]) 
	- minCompPoint([[pcbPosition(boardType), pcbDimensions(boardType)], [componentsPosition(boardType), componentsDimensions(boardType)]]);

/******************************* BOARD SPECIFIC DATA ******************************/
//Board IDs
NG = 0;
DIECIMILA = 1;
DUEMILANOVE = 2;
UNO = 3;
LEONARDO = 4;
MEGA = 5;
MEGA2560 = 6;
DUE = 7;
YUN = 8; 
INTELGALILEO = 9;
TRE = 10;

/********************************** MEASUREMENTS **********************************/
pcbHeight = 1.7;
headerWidth = 2.54;
headerHeight = 9;
mountingHoleRadius = 3.2 / 2;

ngWidth = 53.34;
leonardoDepth = 68.58 + 1.1;           //PCB depth plus offset of USB jack (1.1)
ngDepth = 68.58 + 6.5;
megaDepth = 101.6 + 6.5;               //Coding is my business and business is good!
dueDepth = 101.6 + 1.1;

arduinoHeight = 11 + pcbHeight + 0;

/********************************* MOUNTING HOLES *********************************/

//Duemilanove, Diecimila, NG and earlier
ngHoles = [
		[  2.54, 15.24 ],
		[  17.78, 66.04 ],
		[  45.72, 66.04 ]
		];

//Uno, Leonardo holes
unoHoles = [
		[  2.54, 15.24 ],
		[  17.78, 66.04 ],
		[  45.72, 66.04 ],
		[  50.8, 13.97 ]
		];

//Due and Mega 2560
dueHoles = [
		[  2.54, 15.24 ],
		[  17.78, 66.04 ],
		[  45.72, 66.04 ],
		[  50.8, 13.97 ],
		[  2.54, 90.17 ],
		[  50.8, 96.52 ]
		];

// Original Mega holes
megaHoles = [
		[  2.54, 15.24 ],
		[  50.8, 13.97 ],
		[  2.54, 90.17 ],
		[  50.8, 96.52 ]
		];

boardHoles = [ 
		ngHoles,        //NG
		ngHoles,        //Diecimila
		ngHoles,        //Duemilanove
		unoHoles,       //Uno
		unoHoles,       //Leonardo
		megaHoles,      //Mega
		dueHoles,       //Mega 2560
		dueHoles,       //Due
		0,              //Yun
		0,              //Intel Galileo
       	0               //Tre
		];

/********************************** BOARD SHAPES **********************************/
ngBoardShape = [ 
		[  0.0, 0.0 ],
		[  53.34, 0.0 ],
		[  53.34, 66.04 ],
		[  50.8, 66.04 ],
		[  48.26, 68.58 ],
		[  15.24, 68.58 ],
		[  12.7, 66.04 ],
		[  1.27, 66.04 ],
		[  0.0, 64.77 ]
		];

megaBoardShape = [ 
		[  0.0, 0.0 ],
		[  53.34, 0.0 ],
		[  53.34, 99.06 ],
		[  52.07, 99.06 ],
		[  49.53, 101.6 ],
		[  15.24, 101.6 ],
		[  12.7, 99.06 ],
		[  2.54, 99.06 ],
		[  0.0, 96.52 ]
		];

boardShapes = [ 	
		ngBoardShape,   //NG
		ngBoardShape,   //Diecimila
		ngBoardShape,   //Duemilanove
		ngBoardShape,   //Uno
		ngBoardShape,   //Leonardo
		megaBoardShape, //Mega
		megaBoardShape, //Mega 2560
		megaBoardShape, //Due
		0,             //Yun
		0,             //Intel Galileo
		0              //Tre
		];	

/*********************************** COMPONENTS ***********************************/

//Component data. 
//[position, dimensions, direction(which way would a cable attach), type(header, usb, etc.), color]
ngComponents = [
	[[1.27, 17.526, 0], [headerWidth, headerWidth * 10, headerHeight], [0, 0, 1], HEADER_F, "Black" ],
	[[1.27, 44.45, 0], [headerWidth, headerWidth * 8, headerHeight ], [0, 0, 1], HEADER_F, "Black" ],
	[[49.53, 26.67, 0], [headerWidth, headerWidth * 8, headerHeight ], [0, 0, 1], HEADER_F, "Black" ],
	[[49.53, 49.53, 0], [headerWidth, headerWidth * 6, headerHeight ], [0, 0, 1], HEADER_F, "Black" ],
	[[9.34, -6.5, 0],[12, 16, 11],[0, -1, 0], USB, "LightGray" ],
	[[40.7, -1.8, 0], [9.0, 13.2, 10.9], [0, -1, 0], POWER, "Black" ]
	];

leonardoComponents = [
	[[1.27, 17.526, 0], [headerWidth, headerWidth * 10, headerHeight], [0, 0, 1], HEADER_F, "Black" ],
	[[1.27, 44.45, 0], [headerWidth, headerWidth * 8, headerHeight ], [0, 0, 1], HEADER_F, "Black" ],
	[[49.53, 26.67, 0], [headerWidth, headerWidth * 8, headerHeight ], [0, 0, 1], HEADER_F, "Black" ],
	[[49.53, 49.53, 0], [headerWidth, headerWidth * 6, headerHeight ], [0, 0, 1], HEADER_F, "Black" ],
	[[11.5, -1.1, 0],[7.5, 5.9, 3],[0, -1, 0], USB, "LightGray" ],
	[[40.7, -1.8, 0], [9.0, 13.2, 10.9], [0, -1, 0], POWER, "Black" ]
	];

megaComponents = [
	[[1.27, 22.86, 0], [headerWidth, headerWidth * 8, headerHeight], [0, 0, 1], HEADER_F, "Black"],
	[[1.27, 44.45, 0], [headerWidth, headerWidth * 8, headerHeight], [0, 0, 1], HEADER_F, "Black"],
	[[1.27, 67.31, 0], [headerWidth, headerWidth * 8, headerHeight], [0, 0, 1], HEADER_F, "Black"],
	[[49.53, 31.75, 0], [headerWidth, headerWidth * 6, headerHeight ], [0, 0, 1], HEADER_F, "Black"],
	[[49.53, 49.53, 0], [headerWidth, headerWidth * 8, headerHeight], [0, 0, 1], HEADER_F, "Black"],
	[[49.53, 72.39, 0], [headerWidth, headerWidth * 8, headerHeight], [0, 0, 1], HEADER_F, "Black"],
	[[1.27, 92.71, 0], [headerWidth * 18, headerWidth * 2, headerHeight], [0, 0, 1], HEADER_F, "Black"],
	[[9.34, -6.5, 0],[12, 16, 11],[0, -1, 0], USB, "LightGray"],
	[[40.7, -1.8, 0], [9.0, 13.2, 10.9], [0, -1, 0], POWER, "Black" ]
	];

mega2560Components = [
	[[1.27, 17.526, 0], [headerWidth, headerWidth * 10, headerHeight], [0, 0, 1], HEADER_F, "Black" ],
	[[1.27, 44.45, 0], [headerWidth, headerWidth * 8, headerHeight], [0, 0, 1], HEADER_F, "Black" ],
	[[1.27, 67.31, 0], [headerWidth, headerWidth * 8, headerHeight], [0, 0, 1], HEADER_F, "Black" ],
	[[49.53, 26.67, 0], [headerWidth, headerWidth * 8, headerHeight ], [0, 0, 1], HEADER_F, "Black" ],
	[[49.53, 49.53, 0], [headerWidth, headerWidth * 8, headerHeight], [0, 0, 1], HEADER_F, "Black" ],
	[[49.53, 72.39, 0], [headerWidth, headerWidth * 8, headerHeight], [0, 0, 1], HEADER_F, "Black" ],
	[[1.27, 92.71, 0], [headerWidth * 18, headerWidth * 2, headerHeight], [0, 0, 1], HEADER_F, "Black" ],
	[[9.34, -6.5, 0],[12, 16, 11],[0, -1, 0], USB, "LightGray" ],
	[[40.7, -1.8, 0], [9.0, 13.2, 10.9], [0, -1, 0], POWER, "Black" ]
	];

dueComponents = [
	[[1.27, 17.526, 0], [headerWidth, headerWidth * 10, headerHeight], [0, 0, 1], HEADER_F, "Black"],
	[[1.27, 44.45, 0], [headerWidth, headerWidth * 8, headerHeight], [0, 0, 1], HEADER_F, "Black"],
	[[1.27, 67.31, 0], [headerWidth, headerWidth * 8, headerHeight], [0, 0, 1], HEADER_F, "Black"],
	[[49.53, 26.67, 0], [headerWidth, headerWidth * 8, headerHeight ], [0, 0, 1], HEADER_F, "Black"],
	[[49.53, 49.53, 0], [headerWidth, headerWidth * 8, headerHeight], [0, 0, 1], HEADER_F, "Black"],
	[[49.53, 72.39, 0], [headerWidth, headerWidth * 8, headerHeight], [0, 0, 1], HEADER_F, "Black"],
	[[1.27, 92.71, 0], [headerWidth * 18, headerWidth * 2, headerHeight], [0, 0, 1], HEADER_F, "Black"],
	[[11.5, -1.1, 0], [7.5, 5.9, 3], [0, -1, 0], USB, "LightGray" ],
	[[27.365, -1.1, 0], [7.5, 5.9, 3], [0, -1, 0], USB, "LightGray" ],
	[[40.7, -1.8, 0], [9.0, 13.2, 10.9], [0, -1, 0], POWER, "Black" ]
	];

components = [
	ngComponents,		//NG
	ngComponents,		//Diecimila
	ngComponents,		//Duemilanove
	ngComponents,		//Uno
	leonardoComponents,	//Leonardo
	megaComponents,		//Mega
	mega2560Components,	//Mega 2560
	dueComponents,   	//Due
	0,                 	//Yun
	0,					//Intel Galileo
	0					//Tre
	];

/****************************** NON-BOARD PARAMETERS ******************************/

//Mounting holes
woodscrewHeadRad = 4.6228;	//Number 8 wood screw head radius
woodscrewThreadRad = 2.1336;  	//Number 8 wood screw thread radius
woodscrewHeadHeight = 2.8448;	//Number 8 wood screw head height
